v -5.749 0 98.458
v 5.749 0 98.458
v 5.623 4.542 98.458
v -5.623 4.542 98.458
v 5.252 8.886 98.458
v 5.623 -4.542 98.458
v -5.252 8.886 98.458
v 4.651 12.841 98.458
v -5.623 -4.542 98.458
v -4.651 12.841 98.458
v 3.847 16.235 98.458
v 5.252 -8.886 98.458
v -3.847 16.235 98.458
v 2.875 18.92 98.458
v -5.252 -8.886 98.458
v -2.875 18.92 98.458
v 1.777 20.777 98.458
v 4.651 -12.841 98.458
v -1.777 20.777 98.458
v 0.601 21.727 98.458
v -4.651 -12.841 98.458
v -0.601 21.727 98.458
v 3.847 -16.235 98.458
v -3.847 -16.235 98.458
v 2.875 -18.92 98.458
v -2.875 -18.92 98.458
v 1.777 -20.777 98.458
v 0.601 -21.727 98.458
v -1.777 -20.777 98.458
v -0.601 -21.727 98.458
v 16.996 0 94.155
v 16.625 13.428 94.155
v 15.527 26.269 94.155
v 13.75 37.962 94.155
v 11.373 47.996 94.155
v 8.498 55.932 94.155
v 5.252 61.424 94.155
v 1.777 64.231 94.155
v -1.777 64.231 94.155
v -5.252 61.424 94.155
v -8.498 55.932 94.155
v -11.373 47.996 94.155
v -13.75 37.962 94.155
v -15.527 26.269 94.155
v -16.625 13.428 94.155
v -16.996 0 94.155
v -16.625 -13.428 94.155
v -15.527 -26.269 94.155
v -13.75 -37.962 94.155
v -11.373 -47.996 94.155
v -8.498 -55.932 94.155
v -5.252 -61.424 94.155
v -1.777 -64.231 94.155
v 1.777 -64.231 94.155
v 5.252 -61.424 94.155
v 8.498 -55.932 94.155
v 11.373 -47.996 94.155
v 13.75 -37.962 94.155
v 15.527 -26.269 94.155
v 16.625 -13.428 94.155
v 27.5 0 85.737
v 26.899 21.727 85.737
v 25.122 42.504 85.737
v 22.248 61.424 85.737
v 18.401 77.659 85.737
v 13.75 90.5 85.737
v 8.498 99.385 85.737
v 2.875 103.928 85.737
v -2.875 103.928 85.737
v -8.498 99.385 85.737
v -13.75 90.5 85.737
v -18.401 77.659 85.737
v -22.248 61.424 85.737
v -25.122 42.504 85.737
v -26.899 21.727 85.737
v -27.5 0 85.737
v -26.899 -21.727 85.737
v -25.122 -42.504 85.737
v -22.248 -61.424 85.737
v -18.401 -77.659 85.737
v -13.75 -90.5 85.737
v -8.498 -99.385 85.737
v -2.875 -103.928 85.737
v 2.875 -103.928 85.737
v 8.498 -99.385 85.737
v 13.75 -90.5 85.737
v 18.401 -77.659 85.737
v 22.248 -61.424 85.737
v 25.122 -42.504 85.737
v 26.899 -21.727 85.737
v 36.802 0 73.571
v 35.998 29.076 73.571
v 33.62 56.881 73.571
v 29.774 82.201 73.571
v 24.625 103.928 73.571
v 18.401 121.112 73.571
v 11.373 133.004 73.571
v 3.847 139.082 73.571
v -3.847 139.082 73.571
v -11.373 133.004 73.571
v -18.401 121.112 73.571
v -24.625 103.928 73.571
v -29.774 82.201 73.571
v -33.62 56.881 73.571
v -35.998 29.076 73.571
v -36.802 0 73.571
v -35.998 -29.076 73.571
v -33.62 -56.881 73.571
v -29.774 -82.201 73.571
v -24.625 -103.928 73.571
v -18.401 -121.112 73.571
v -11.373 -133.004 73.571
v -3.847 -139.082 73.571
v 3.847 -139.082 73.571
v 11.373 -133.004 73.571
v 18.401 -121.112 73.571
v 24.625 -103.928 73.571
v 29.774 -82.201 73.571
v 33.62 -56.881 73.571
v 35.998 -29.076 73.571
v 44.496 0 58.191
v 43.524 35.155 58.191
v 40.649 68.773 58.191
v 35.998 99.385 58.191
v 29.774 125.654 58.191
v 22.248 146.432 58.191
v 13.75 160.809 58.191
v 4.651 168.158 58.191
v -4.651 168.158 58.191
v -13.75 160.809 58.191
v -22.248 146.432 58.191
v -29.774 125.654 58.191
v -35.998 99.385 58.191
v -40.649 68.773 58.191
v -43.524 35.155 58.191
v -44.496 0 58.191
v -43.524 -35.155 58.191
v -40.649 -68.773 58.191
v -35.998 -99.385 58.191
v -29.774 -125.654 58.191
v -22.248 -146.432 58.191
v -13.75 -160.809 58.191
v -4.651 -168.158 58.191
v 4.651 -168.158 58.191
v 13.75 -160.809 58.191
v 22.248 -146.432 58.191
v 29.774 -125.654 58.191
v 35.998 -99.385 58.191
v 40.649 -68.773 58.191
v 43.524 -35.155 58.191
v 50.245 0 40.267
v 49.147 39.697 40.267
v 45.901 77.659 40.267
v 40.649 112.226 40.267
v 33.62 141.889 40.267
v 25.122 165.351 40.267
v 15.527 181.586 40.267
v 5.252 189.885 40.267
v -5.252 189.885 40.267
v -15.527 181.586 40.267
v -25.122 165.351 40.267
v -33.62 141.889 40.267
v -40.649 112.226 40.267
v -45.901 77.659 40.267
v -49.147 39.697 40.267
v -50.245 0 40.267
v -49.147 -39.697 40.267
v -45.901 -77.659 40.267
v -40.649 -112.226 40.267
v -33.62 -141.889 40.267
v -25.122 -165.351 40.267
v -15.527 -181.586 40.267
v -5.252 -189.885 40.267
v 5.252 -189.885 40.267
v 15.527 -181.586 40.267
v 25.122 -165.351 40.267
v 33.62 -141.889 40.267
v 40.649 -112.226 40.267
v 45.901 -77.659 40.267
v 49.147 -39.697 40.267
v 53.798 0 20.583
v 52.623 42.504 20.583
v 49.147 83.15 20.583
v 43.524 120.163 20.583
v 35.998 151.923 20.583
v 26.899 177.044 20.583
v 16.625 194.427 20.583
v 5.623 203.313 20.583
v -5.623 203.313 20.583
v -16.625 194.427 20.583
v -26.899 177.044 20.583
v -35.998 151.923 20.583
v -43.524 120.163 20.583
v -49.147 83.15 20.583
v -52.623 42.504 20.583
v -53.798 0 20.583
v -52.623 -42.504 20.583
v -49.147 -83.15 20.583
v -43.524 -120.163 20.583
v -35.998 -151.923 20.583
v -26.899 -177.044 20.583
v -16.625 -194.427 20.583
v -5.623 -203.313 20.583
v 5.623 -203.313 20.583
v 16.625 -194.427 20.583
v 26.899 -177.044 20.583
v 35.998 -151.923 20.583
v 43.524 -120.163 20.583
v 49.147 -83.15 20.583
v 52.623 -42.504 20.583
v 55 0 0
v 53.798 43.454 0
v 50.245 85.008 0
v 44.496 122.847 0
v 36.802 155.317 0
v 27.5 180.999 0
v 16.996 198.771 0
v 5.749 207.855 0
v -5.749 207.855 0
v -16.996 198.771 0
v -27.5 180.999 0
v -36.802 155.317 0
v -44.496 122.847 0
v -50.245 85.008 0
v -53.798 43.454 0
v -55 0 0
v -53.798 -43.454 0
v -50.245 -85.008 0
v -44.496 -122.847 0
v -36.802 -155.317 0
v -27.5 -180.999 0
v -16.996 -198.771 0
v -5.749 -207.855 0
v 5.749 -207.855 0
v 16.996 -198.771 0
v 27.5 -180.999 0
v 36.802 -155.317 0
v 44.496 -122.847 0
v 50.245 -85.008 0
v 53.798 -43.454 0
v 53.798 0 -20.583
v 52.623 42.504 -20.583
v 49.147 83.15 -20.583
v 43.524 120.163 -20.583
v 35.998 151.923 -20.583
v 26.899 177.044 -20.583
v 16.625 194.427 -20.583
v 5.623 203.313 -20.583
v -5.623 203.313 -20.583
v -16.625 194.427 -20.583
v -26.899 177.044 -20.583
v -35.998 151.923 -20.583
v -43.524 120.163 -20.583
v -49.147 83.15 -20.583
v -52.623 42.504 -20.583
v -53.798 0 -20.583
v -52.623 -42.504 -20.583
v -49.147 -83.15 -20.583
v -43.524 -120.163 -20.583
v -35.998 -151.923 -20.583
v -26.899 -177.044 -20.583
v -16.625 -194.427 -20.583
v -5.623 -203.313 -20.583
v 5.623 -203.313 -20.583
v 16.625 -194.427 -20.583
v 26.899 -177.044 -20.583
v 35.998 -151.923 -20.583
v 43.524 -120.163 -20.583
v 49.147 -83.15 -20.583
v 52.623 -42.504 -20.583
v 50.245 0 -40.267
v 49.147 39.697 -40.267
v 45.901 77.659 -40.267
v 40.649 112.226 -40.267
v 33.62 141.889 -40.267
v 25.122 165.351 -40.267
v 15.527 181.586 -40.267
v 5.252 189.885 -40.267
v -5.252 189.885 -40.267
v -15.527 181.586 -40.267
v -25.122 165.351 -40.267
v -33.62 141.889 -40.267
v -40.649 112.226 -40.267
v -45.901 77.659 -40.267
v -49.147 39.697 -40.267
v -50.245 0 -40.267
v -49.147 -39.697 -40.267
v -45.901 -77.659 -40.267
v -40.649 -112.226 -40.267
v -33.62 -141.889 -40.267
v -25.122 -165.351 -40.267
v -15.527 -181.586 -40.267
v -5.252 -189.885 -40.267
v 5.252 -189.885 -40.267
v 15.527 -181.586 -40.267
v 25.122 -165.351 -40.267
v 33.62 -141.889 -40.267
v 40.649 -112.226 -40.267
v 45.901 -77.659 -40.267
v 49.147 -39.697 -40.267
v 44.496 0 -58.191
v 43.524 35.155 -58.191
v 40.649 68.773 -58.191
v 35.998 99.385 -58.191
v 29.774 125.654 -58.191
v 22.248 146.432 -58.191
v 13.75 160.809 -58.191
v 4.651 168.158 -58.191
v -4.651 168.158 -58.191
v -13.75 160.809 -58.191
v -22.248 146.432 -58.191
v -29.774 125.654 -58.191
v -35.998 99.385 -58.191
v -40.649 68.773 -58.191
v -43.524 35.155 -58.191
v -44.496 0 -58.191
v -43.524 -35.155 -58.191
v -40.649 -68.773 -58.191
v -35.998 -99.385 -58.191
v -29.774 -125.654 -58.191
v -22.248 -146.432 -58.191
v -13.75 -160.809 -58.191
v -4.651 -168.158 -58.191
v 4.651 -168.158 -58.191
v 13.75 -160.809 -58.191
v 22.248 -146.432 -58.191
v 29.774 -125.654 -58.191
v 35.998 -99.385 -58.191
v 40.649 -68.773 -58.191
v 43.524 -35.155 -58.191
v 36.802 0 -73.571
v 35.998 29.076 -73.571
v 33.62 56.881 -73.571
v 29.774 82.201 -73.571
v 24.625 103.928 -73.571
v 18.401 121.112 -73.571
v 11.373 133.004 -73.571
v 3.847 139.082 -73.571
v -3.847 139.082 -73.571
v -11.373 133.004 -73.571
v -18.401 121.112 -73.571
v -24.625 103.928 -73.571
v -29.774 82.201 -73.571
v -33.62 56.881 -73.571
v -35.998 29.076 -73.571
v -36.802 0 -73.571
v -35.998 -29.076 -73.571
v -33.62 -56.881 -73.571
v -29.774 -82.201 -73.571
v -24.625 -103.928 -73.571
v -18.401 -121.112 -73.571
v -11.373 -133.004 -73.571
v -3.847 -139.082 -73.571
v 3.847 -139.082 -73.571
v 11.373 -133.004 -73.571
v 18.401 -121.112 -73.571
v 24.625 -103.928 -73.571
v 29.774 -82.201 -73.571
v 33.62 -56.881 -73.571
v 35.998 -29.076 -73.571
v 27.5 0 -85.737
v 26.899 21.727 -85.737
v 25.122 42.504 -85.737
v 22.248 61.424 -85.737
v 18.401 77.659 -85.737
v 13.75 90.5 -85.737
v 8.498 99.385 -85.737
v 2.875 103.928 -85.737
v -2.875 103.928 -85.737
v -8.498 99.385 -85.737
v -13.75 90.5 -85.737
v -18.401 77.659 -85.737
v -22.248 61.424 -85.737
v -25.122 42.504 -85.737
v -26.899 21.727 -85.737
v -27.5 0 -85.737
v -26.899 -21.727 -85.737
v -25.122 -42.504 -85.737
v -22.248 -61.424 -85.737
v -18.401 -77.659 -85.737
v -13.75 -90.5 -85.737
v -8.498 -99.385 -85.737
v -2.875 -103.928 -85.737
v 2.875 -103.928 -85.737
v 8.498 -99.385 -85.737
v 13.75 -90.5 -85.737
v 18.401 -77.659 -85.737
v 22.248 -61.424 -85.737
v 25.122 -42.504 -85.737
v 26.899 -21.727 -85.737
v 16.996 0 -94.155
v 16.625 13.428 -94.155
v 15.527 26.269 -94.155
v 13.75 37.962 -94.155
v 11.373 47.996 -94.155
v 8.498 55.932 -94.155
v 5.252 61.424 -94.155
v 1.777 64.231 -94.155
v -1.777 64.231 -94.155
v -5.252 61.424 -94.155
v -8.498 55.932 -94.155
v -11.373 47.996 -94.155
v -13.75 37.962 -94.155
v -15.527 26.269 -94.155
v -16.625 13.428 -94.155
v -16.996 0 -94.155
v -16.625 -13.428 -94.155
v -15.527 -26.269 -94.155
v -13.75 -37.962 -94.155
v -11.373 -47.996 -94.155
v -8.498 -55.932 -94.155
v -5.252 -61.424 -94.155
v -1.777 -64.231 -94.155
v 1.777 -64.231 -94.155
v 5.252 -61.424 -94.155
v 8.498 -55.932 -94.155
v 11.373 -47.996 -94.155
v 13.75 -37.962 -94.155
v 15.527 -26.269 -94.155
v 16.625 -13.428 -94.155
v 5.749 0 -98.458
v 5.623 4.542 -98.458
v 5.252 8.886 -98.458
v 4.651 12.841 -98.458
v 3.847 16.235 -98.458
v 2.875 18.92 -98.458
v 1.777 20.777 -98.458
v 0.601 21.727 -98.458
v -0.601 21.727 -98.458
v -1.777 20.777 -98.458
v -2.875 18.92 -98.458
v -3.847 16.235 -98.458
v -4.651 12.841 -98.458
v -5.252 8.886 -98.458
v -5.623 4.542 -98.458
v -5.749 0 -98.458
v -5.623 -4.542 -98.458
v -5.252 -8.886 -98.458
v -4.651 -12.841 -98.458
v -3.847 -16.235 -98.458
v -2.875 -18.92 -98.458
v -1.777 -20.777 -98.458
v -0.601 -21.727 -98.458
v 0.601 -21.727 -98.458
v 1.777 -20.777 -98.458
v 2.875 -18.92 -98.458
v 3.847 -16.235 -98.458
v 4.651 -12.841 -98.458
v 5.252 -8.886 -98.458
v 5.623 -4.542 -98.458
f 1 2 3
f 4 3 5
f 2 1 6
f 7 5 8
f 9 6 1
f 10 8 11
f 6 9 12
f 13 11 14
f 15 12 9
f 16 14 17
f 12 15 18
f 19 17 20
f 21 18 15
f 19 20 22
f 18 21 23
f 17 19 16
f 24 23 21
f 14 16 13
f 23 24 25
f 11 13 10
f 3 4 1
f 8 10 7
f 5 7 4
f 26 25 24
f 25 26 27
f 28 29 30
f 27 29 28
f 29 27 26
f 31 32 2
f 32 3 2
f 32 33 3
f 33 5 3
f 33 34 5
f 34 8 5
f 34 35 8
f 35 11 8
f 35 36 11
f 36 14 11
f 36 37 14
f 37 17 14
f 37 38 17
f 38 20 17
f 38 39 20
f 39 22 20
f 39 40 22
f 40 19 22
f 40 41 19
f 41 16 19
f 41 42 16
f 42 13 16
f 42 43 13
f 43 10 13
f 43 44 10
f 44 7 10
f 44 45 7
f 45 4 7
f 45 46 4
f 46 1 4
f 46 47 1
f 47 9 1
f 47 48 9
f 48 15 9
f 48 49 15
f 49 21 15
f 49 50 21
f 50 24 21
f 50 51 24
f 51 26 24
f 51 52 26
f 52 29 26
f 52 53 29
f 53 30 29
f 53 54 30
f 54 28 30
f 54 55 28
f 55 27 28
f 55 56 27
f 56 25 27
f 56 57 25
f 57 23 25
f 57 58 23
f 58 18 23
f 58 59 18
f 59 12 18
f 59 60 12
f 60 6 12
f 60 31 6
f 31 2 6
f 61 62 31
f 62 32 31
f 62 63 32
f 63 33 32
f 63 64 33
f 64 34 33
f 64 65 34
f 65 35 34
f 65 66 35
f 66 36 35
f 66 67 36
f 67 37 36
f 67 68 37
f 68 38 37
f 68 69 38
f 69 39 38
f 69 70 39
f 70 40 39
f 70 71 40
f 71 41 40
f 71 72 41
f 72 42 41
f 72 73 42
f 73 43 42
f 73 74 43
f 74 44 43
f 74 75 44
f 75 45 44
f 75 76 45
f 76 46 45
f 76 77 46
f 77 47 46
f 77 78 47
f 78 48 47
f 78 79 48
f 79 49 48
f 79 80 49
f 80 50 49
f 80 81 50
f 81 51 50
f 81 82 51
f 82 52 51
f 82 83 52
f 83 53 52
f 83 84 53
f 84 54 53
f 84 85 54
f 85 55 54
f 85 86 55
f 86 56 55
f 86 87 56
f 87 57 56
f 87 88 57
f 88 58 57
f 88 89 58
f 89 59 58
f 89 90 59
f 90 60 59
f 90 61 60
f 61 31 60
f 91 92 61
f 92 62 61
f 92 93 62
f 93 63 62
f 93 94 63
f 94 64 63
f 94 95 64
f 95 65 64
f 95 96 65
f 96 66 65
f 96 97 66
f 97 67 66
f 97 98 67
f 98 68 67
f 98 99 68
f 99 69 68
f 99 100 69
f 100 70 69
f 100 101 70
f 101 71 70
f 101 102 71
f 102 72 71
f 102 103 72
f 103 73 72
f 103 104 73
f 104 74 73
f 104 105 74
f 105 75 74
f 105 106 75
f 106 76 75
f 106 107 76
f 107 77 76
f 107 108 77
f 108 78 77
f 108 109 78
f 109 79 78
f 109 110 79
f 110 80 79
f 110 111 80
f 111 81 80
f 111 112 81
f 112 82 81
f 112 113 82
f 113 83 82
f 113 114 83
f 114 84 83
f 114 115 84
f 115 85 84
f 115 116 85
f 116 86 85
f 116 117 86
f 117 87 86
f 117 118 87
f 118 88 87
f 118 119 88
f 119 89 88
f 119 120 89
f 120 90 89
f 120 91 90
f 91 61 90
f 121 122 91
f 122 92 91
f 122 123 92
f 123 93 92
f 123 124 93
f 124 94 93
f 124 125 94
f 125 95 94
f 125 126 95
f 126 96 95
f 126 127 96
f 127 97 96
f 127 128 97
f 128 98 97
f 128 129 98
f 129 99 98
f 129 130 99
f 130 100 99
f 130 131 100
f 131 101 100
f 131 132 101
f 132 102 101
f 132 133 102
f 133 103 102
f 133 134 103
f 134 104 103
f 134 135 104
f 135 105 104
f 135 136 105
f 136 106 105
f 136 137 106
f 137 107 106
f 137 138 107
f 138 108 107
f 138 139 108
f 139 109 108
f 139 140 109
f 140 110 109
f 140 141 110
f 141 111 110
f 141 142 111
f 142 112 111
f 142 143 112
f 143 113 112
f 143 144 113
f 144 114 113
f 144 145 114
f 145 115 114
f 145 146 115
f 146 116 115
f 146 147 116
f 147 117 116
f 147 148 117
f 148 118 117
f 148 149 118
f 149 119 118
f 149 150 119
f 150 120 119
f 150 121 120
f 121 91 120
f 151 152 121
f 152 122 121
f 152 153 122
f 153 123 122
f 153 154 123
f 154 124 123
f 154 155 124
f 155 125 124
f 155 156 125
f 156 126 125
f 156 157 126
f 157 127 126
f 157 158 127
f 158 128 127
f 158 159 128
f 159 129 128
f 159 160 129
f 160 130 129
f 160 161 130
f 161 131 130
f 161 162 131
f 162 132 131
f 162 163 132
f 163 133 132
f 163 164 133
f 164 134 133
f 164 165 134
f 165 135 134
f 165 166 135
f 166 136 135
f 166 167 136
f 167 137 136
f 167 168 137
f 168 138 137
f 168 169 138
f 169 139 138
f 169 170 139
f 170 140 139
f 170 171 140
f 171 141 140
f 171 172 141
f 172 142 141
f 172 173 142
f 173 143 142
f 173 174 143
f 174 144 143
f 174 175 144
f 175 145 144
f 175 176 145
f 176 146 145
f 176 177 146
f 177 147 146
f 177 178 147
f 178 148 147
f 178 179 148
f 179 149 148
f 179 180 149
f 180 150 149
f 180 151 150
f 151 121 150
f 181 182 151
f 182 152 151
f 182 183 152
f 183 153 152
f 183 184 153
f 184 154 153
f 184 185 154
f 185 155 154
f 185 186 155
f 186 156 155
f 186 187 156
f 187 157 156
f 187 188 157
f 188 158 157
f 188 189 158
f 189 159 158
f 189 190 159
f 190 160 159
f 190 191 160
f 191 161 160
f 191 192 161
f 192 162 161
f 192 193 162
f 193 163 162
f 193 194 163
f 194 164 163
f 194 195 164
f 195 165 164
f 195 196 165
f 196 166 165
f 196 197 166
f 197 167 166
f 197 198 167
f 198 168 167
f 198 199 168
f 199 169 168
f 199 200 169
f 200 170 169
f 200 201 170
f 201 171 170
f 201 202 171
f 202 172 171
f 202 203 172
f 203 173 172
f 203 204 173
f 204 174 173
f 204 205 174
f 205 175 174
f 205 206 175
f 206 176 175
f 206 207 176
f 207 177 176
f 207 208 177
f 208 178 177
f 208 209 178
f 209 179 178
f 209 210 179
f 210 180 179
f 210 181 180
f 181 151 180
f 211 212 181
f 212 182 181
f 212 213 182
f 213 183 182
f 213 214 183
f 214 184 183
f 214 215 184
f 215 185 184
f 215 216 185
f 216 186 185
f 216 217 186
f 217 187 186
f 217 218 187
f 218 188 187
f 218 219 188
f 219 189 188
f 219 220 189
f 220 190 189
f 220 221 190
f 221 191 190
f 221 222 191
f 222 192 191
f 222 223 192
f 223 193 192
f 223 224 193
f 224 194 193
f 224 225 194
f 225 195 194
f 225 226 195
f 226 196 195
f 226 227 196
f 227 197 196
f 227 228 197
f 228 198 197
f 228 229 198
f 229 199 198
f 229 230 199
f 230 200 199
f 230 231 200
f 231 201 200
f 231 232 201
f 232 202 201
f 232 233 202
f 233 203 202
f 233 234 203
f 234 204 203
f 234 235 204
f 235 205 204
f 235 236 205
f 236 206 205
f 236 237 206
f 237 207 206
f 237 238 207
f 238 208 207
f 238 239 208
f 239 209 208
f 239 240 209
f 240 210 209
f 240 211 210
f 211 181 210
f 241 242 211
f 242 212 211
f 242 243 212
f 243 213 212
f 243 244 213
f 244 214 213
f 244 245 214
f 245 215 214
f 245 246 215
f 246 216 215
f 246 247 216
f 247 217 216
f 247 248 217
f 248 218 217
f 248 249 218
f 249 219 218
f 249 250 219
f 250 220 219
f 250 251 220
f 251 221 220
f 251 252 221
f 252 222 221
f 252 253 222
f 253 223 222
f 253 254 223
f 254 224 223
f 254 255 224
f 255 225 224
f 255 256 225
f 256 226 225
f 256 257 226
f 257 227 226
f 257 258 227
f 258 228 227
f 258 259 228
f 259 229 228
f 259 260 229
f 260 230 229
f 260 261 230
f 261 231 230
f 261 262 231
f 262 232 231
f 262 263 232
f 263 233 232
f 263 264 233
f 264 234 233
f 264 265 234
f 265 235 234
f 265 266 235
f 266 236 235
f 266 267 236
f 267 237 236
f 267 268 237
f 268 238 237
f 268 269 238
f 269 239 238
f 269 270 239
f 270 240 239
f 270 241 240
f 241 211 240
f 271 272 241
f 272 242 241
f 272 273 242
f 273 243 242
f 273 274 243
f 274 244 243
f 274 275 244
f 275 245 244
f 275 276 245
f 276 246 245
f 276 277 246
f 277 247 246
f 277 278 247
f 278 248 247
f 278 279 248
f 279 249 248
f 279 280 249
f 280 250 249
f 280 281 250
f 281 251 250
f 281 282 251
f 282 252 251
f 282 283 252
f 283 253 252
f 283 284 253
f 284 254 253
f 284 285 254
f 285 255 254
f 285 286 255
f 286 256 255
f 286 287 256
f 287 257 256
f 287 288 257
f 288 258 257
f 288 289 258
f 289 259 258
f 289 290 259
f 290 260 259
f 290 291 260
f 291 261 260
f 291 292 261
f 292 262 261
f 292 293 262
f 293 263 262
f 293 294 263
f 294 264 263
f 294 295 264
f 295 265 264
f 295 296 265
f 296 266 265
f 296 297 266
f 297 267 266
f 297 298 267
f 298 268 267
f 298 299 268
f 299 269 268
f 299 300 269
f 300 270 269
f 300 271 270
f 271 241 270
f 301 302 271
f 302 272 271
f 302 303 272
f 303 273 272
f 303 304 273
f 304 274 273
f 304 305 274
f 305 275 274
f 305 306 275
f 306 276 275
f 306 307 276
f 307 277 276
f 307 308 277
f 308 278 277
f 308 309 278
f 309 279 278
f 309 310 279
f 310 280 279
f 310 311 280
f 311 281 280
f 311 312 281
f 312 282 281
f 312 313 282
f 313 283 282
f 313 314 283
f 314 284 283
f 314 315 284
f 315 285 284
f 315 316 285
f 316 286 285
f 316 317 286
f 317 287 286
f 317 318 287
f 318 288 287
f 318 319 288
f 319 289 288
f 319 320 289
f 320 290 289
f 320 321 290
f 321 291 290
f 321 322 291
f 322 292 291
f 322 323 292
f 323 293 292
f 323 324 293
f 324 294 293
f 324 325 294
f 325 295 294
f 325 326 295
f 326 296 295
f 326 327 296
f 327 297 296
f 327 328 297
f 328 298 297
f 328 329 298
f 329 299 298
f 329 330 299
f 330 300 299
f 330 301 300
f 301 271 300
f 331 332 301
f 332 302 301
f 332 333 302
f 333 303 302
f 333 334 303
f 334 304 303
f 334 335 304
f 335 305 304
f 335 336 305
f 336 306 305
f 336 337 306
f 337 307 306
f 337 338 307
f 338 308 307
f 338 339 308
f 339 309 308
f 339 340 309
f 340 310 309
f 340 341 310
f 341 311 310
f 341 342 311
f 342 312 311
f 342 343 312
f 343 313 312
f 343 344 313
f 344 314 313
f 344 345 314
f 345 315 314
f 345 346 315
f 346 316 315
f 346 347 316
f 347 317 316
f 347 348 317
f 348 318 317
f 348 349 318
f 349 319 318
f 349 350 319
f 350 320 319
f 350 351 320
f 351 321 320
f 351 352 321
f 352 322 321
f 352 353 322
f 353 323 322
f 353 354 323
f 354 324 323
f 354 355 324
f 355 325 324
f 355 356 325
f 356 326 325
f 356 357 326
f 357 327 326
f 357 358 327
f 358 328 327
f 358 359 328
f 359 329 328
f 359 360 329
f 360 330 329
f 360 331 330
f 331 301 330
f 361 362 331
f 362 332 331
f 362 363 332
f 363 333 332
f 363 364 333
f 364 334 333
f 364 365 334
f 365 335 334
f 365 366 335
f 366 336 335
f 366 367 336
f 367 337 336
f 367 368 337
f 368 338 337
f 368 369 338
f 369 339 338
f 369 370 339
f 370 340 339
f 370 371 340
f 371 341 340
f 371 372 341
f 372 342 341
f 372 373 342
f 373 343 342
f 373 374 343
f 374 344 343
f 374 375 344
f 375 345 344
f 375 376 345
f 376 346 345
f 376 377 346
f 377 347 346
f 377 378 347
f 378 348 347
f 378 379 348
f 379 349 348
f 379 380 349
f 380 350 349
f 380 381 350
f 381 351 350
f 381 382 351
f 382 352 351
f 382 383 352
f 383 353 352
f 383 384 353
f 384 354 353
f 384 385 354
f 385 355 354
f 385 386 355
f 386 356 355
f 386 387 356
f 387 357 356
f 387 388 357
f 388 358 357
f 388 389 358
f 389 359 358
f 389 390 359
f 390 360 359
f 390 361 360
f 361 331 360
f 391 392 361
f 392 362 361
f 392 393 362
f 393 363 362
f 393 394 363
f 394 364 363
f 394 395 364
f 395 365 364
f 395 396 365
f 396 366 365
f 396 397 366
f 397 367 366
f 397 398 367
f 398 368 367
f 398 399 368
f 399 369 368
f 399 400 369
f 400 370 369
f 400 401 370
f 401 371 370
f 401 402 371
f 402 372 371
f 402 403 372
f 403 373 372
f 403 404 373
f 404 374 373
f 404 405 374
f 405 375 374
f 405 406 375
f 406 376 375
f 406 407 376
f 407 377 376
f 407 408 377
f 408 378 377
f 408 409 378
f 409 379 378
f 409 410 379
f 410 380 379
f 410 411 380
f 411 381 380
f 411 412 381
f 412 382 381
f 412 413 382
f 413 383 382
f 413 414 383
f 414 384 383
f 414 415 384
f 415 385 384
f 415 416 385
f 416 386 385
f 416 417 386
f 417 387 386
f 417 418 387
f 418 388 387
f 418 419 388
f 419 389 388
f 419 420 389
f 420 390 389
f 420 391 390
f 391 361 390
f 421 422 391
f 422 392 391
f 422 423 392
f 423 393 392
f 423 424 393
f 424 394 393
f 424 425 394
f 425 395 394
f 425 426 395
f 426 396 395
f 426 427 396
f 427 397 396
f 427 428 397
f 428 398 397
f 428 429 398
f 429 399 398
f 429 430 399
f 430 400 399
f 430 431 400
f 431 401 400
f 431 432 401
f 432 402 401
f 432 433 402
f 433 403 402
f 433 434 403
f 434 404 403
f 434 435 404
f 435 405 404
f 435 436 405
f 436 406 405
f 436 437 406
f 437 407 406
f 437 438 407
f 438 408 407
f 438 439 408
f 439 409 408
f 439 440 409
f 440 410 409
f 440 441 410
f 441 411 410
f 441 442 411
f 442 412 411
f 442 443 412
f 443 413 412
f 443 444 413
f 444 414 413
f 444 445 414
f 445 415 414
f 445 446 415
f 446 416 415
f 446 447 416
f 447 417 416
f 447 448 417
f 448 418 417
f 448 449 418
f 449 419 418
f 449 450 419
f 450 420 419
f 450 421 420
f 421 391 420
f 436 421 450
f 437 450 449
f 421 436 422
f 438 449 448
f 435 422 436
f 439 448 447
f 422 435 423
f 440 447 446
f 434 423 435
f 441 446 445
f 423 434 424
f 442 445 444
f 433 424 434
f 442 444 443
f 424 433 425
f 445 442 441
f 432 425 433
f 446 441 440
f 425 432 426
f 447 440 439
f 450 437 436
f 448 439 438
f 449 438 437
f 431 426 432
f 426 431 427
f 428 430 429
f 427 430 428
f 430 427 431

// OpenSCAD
// Generated by SolidPython 1.0.1 on 2020-07-29 00:46:47


scale(v = [5, 19, 9]) {
	sphere(r = 11);
}
/***********************************************
*********      SolidPython code:      **********
************************************************
 
# import packages: SolidPython
from solid import *
from solid.utils import *
from itertools import chain, combinations, permutations


class Resize:

    def __init__(self, scad_file):
        self.scad_file = scad_file
        #self.scad_file = import_scad(scad_file)
        # cone/cylinder param:
        self.r1 = 0
        self.r2 = 0
        self.h = 0
        # rectangular prism param:
        self.w = 0
        self.l = 0
        # ellipse param:
        self.r = 0

    # import OpenScad code (file name corresponds to shape)


    # classify shape + parameters
    def assign(self, param1, param2, param3):
        if self.scad_file == 'cone.scad':
            self.r1 = param1
            self.r2 = param2
            self.h = param3
        elif self.scad_file == 'cylinder.scad':
            self.r1 = param1
            self.r2 = param2
            self.h = param3
        elif self.scad_file == 'rectangularPrism.scad':
            self.h = param1
            self.l = param2
            self.w = param3
        else:
            self.r = param1
            self.h = param2

    # resize parameters
    def iterate(self):
        x = range(3, 20, 2)
        i = 1
        if self.scad_file == 'cone.scad':
            tempList = list(permutations(x, 2))
            for temp in tempList:
                param1 = temp[0]
                param2 = temp[1]
                filepath = 'produced_scad_files/' + 'cone' + str(param1) + '_' + str(param2) + '_' + '.scad'
                scad_render_to_file(cylinder(h=param1, r1=param2, r2=0), filepath)

        elif self.scad_file == 'cylinder.scad':
            tempList = list(permutations(x, 3))
            for temp in tempList:
                param1 = temp[0]
                param2 = temp[1]
                filepath = 'produced_scad_files/' + 'cylinder' + str(param1) + '_' + str(param2) + '_' + '.scad'
                scad_render_to_file(cylinder(h=param1, r1=param2, r2=param2), filepath)

        elif self.scad_file == 'rectangularPrism.scad':
            tempList = list(permutations(x, 3))
            for temp in tempList:
                param1 = temp[0]
                param2 = temp[1]
                param3 = temp[2]
                filepath = 'produced_scad_files/' + 'rectangularPrism' + str(param1) + '_' + str(param2) + '_' + str(
                    param3) + '.scad'
                scad_render_to_file(cube(size=(param1, param2, param3)), filepath)

        elif self.scad_file == 'ellipse.scad':
            tempList = list(permutations(x, 4))
            for temp in tempList:
                param1 = temp[0]
                param2 = temp[1]
                param3 = temp[2]
                param4 = temp[3]
                filepath = 'produced_scad_files/' + 'ellipse' + str(param1) + '_' + str(param2) + '_' + str(param3) + '_' + str(param4) + '.scad'
                scad_render_to_file(scale([param1, param2, param3])(sphere(r=param4)), filepath)

    def render_to_scadfile(self):
        scad_render_to_file(scad, 'example.scad') 
 
************************************************/
